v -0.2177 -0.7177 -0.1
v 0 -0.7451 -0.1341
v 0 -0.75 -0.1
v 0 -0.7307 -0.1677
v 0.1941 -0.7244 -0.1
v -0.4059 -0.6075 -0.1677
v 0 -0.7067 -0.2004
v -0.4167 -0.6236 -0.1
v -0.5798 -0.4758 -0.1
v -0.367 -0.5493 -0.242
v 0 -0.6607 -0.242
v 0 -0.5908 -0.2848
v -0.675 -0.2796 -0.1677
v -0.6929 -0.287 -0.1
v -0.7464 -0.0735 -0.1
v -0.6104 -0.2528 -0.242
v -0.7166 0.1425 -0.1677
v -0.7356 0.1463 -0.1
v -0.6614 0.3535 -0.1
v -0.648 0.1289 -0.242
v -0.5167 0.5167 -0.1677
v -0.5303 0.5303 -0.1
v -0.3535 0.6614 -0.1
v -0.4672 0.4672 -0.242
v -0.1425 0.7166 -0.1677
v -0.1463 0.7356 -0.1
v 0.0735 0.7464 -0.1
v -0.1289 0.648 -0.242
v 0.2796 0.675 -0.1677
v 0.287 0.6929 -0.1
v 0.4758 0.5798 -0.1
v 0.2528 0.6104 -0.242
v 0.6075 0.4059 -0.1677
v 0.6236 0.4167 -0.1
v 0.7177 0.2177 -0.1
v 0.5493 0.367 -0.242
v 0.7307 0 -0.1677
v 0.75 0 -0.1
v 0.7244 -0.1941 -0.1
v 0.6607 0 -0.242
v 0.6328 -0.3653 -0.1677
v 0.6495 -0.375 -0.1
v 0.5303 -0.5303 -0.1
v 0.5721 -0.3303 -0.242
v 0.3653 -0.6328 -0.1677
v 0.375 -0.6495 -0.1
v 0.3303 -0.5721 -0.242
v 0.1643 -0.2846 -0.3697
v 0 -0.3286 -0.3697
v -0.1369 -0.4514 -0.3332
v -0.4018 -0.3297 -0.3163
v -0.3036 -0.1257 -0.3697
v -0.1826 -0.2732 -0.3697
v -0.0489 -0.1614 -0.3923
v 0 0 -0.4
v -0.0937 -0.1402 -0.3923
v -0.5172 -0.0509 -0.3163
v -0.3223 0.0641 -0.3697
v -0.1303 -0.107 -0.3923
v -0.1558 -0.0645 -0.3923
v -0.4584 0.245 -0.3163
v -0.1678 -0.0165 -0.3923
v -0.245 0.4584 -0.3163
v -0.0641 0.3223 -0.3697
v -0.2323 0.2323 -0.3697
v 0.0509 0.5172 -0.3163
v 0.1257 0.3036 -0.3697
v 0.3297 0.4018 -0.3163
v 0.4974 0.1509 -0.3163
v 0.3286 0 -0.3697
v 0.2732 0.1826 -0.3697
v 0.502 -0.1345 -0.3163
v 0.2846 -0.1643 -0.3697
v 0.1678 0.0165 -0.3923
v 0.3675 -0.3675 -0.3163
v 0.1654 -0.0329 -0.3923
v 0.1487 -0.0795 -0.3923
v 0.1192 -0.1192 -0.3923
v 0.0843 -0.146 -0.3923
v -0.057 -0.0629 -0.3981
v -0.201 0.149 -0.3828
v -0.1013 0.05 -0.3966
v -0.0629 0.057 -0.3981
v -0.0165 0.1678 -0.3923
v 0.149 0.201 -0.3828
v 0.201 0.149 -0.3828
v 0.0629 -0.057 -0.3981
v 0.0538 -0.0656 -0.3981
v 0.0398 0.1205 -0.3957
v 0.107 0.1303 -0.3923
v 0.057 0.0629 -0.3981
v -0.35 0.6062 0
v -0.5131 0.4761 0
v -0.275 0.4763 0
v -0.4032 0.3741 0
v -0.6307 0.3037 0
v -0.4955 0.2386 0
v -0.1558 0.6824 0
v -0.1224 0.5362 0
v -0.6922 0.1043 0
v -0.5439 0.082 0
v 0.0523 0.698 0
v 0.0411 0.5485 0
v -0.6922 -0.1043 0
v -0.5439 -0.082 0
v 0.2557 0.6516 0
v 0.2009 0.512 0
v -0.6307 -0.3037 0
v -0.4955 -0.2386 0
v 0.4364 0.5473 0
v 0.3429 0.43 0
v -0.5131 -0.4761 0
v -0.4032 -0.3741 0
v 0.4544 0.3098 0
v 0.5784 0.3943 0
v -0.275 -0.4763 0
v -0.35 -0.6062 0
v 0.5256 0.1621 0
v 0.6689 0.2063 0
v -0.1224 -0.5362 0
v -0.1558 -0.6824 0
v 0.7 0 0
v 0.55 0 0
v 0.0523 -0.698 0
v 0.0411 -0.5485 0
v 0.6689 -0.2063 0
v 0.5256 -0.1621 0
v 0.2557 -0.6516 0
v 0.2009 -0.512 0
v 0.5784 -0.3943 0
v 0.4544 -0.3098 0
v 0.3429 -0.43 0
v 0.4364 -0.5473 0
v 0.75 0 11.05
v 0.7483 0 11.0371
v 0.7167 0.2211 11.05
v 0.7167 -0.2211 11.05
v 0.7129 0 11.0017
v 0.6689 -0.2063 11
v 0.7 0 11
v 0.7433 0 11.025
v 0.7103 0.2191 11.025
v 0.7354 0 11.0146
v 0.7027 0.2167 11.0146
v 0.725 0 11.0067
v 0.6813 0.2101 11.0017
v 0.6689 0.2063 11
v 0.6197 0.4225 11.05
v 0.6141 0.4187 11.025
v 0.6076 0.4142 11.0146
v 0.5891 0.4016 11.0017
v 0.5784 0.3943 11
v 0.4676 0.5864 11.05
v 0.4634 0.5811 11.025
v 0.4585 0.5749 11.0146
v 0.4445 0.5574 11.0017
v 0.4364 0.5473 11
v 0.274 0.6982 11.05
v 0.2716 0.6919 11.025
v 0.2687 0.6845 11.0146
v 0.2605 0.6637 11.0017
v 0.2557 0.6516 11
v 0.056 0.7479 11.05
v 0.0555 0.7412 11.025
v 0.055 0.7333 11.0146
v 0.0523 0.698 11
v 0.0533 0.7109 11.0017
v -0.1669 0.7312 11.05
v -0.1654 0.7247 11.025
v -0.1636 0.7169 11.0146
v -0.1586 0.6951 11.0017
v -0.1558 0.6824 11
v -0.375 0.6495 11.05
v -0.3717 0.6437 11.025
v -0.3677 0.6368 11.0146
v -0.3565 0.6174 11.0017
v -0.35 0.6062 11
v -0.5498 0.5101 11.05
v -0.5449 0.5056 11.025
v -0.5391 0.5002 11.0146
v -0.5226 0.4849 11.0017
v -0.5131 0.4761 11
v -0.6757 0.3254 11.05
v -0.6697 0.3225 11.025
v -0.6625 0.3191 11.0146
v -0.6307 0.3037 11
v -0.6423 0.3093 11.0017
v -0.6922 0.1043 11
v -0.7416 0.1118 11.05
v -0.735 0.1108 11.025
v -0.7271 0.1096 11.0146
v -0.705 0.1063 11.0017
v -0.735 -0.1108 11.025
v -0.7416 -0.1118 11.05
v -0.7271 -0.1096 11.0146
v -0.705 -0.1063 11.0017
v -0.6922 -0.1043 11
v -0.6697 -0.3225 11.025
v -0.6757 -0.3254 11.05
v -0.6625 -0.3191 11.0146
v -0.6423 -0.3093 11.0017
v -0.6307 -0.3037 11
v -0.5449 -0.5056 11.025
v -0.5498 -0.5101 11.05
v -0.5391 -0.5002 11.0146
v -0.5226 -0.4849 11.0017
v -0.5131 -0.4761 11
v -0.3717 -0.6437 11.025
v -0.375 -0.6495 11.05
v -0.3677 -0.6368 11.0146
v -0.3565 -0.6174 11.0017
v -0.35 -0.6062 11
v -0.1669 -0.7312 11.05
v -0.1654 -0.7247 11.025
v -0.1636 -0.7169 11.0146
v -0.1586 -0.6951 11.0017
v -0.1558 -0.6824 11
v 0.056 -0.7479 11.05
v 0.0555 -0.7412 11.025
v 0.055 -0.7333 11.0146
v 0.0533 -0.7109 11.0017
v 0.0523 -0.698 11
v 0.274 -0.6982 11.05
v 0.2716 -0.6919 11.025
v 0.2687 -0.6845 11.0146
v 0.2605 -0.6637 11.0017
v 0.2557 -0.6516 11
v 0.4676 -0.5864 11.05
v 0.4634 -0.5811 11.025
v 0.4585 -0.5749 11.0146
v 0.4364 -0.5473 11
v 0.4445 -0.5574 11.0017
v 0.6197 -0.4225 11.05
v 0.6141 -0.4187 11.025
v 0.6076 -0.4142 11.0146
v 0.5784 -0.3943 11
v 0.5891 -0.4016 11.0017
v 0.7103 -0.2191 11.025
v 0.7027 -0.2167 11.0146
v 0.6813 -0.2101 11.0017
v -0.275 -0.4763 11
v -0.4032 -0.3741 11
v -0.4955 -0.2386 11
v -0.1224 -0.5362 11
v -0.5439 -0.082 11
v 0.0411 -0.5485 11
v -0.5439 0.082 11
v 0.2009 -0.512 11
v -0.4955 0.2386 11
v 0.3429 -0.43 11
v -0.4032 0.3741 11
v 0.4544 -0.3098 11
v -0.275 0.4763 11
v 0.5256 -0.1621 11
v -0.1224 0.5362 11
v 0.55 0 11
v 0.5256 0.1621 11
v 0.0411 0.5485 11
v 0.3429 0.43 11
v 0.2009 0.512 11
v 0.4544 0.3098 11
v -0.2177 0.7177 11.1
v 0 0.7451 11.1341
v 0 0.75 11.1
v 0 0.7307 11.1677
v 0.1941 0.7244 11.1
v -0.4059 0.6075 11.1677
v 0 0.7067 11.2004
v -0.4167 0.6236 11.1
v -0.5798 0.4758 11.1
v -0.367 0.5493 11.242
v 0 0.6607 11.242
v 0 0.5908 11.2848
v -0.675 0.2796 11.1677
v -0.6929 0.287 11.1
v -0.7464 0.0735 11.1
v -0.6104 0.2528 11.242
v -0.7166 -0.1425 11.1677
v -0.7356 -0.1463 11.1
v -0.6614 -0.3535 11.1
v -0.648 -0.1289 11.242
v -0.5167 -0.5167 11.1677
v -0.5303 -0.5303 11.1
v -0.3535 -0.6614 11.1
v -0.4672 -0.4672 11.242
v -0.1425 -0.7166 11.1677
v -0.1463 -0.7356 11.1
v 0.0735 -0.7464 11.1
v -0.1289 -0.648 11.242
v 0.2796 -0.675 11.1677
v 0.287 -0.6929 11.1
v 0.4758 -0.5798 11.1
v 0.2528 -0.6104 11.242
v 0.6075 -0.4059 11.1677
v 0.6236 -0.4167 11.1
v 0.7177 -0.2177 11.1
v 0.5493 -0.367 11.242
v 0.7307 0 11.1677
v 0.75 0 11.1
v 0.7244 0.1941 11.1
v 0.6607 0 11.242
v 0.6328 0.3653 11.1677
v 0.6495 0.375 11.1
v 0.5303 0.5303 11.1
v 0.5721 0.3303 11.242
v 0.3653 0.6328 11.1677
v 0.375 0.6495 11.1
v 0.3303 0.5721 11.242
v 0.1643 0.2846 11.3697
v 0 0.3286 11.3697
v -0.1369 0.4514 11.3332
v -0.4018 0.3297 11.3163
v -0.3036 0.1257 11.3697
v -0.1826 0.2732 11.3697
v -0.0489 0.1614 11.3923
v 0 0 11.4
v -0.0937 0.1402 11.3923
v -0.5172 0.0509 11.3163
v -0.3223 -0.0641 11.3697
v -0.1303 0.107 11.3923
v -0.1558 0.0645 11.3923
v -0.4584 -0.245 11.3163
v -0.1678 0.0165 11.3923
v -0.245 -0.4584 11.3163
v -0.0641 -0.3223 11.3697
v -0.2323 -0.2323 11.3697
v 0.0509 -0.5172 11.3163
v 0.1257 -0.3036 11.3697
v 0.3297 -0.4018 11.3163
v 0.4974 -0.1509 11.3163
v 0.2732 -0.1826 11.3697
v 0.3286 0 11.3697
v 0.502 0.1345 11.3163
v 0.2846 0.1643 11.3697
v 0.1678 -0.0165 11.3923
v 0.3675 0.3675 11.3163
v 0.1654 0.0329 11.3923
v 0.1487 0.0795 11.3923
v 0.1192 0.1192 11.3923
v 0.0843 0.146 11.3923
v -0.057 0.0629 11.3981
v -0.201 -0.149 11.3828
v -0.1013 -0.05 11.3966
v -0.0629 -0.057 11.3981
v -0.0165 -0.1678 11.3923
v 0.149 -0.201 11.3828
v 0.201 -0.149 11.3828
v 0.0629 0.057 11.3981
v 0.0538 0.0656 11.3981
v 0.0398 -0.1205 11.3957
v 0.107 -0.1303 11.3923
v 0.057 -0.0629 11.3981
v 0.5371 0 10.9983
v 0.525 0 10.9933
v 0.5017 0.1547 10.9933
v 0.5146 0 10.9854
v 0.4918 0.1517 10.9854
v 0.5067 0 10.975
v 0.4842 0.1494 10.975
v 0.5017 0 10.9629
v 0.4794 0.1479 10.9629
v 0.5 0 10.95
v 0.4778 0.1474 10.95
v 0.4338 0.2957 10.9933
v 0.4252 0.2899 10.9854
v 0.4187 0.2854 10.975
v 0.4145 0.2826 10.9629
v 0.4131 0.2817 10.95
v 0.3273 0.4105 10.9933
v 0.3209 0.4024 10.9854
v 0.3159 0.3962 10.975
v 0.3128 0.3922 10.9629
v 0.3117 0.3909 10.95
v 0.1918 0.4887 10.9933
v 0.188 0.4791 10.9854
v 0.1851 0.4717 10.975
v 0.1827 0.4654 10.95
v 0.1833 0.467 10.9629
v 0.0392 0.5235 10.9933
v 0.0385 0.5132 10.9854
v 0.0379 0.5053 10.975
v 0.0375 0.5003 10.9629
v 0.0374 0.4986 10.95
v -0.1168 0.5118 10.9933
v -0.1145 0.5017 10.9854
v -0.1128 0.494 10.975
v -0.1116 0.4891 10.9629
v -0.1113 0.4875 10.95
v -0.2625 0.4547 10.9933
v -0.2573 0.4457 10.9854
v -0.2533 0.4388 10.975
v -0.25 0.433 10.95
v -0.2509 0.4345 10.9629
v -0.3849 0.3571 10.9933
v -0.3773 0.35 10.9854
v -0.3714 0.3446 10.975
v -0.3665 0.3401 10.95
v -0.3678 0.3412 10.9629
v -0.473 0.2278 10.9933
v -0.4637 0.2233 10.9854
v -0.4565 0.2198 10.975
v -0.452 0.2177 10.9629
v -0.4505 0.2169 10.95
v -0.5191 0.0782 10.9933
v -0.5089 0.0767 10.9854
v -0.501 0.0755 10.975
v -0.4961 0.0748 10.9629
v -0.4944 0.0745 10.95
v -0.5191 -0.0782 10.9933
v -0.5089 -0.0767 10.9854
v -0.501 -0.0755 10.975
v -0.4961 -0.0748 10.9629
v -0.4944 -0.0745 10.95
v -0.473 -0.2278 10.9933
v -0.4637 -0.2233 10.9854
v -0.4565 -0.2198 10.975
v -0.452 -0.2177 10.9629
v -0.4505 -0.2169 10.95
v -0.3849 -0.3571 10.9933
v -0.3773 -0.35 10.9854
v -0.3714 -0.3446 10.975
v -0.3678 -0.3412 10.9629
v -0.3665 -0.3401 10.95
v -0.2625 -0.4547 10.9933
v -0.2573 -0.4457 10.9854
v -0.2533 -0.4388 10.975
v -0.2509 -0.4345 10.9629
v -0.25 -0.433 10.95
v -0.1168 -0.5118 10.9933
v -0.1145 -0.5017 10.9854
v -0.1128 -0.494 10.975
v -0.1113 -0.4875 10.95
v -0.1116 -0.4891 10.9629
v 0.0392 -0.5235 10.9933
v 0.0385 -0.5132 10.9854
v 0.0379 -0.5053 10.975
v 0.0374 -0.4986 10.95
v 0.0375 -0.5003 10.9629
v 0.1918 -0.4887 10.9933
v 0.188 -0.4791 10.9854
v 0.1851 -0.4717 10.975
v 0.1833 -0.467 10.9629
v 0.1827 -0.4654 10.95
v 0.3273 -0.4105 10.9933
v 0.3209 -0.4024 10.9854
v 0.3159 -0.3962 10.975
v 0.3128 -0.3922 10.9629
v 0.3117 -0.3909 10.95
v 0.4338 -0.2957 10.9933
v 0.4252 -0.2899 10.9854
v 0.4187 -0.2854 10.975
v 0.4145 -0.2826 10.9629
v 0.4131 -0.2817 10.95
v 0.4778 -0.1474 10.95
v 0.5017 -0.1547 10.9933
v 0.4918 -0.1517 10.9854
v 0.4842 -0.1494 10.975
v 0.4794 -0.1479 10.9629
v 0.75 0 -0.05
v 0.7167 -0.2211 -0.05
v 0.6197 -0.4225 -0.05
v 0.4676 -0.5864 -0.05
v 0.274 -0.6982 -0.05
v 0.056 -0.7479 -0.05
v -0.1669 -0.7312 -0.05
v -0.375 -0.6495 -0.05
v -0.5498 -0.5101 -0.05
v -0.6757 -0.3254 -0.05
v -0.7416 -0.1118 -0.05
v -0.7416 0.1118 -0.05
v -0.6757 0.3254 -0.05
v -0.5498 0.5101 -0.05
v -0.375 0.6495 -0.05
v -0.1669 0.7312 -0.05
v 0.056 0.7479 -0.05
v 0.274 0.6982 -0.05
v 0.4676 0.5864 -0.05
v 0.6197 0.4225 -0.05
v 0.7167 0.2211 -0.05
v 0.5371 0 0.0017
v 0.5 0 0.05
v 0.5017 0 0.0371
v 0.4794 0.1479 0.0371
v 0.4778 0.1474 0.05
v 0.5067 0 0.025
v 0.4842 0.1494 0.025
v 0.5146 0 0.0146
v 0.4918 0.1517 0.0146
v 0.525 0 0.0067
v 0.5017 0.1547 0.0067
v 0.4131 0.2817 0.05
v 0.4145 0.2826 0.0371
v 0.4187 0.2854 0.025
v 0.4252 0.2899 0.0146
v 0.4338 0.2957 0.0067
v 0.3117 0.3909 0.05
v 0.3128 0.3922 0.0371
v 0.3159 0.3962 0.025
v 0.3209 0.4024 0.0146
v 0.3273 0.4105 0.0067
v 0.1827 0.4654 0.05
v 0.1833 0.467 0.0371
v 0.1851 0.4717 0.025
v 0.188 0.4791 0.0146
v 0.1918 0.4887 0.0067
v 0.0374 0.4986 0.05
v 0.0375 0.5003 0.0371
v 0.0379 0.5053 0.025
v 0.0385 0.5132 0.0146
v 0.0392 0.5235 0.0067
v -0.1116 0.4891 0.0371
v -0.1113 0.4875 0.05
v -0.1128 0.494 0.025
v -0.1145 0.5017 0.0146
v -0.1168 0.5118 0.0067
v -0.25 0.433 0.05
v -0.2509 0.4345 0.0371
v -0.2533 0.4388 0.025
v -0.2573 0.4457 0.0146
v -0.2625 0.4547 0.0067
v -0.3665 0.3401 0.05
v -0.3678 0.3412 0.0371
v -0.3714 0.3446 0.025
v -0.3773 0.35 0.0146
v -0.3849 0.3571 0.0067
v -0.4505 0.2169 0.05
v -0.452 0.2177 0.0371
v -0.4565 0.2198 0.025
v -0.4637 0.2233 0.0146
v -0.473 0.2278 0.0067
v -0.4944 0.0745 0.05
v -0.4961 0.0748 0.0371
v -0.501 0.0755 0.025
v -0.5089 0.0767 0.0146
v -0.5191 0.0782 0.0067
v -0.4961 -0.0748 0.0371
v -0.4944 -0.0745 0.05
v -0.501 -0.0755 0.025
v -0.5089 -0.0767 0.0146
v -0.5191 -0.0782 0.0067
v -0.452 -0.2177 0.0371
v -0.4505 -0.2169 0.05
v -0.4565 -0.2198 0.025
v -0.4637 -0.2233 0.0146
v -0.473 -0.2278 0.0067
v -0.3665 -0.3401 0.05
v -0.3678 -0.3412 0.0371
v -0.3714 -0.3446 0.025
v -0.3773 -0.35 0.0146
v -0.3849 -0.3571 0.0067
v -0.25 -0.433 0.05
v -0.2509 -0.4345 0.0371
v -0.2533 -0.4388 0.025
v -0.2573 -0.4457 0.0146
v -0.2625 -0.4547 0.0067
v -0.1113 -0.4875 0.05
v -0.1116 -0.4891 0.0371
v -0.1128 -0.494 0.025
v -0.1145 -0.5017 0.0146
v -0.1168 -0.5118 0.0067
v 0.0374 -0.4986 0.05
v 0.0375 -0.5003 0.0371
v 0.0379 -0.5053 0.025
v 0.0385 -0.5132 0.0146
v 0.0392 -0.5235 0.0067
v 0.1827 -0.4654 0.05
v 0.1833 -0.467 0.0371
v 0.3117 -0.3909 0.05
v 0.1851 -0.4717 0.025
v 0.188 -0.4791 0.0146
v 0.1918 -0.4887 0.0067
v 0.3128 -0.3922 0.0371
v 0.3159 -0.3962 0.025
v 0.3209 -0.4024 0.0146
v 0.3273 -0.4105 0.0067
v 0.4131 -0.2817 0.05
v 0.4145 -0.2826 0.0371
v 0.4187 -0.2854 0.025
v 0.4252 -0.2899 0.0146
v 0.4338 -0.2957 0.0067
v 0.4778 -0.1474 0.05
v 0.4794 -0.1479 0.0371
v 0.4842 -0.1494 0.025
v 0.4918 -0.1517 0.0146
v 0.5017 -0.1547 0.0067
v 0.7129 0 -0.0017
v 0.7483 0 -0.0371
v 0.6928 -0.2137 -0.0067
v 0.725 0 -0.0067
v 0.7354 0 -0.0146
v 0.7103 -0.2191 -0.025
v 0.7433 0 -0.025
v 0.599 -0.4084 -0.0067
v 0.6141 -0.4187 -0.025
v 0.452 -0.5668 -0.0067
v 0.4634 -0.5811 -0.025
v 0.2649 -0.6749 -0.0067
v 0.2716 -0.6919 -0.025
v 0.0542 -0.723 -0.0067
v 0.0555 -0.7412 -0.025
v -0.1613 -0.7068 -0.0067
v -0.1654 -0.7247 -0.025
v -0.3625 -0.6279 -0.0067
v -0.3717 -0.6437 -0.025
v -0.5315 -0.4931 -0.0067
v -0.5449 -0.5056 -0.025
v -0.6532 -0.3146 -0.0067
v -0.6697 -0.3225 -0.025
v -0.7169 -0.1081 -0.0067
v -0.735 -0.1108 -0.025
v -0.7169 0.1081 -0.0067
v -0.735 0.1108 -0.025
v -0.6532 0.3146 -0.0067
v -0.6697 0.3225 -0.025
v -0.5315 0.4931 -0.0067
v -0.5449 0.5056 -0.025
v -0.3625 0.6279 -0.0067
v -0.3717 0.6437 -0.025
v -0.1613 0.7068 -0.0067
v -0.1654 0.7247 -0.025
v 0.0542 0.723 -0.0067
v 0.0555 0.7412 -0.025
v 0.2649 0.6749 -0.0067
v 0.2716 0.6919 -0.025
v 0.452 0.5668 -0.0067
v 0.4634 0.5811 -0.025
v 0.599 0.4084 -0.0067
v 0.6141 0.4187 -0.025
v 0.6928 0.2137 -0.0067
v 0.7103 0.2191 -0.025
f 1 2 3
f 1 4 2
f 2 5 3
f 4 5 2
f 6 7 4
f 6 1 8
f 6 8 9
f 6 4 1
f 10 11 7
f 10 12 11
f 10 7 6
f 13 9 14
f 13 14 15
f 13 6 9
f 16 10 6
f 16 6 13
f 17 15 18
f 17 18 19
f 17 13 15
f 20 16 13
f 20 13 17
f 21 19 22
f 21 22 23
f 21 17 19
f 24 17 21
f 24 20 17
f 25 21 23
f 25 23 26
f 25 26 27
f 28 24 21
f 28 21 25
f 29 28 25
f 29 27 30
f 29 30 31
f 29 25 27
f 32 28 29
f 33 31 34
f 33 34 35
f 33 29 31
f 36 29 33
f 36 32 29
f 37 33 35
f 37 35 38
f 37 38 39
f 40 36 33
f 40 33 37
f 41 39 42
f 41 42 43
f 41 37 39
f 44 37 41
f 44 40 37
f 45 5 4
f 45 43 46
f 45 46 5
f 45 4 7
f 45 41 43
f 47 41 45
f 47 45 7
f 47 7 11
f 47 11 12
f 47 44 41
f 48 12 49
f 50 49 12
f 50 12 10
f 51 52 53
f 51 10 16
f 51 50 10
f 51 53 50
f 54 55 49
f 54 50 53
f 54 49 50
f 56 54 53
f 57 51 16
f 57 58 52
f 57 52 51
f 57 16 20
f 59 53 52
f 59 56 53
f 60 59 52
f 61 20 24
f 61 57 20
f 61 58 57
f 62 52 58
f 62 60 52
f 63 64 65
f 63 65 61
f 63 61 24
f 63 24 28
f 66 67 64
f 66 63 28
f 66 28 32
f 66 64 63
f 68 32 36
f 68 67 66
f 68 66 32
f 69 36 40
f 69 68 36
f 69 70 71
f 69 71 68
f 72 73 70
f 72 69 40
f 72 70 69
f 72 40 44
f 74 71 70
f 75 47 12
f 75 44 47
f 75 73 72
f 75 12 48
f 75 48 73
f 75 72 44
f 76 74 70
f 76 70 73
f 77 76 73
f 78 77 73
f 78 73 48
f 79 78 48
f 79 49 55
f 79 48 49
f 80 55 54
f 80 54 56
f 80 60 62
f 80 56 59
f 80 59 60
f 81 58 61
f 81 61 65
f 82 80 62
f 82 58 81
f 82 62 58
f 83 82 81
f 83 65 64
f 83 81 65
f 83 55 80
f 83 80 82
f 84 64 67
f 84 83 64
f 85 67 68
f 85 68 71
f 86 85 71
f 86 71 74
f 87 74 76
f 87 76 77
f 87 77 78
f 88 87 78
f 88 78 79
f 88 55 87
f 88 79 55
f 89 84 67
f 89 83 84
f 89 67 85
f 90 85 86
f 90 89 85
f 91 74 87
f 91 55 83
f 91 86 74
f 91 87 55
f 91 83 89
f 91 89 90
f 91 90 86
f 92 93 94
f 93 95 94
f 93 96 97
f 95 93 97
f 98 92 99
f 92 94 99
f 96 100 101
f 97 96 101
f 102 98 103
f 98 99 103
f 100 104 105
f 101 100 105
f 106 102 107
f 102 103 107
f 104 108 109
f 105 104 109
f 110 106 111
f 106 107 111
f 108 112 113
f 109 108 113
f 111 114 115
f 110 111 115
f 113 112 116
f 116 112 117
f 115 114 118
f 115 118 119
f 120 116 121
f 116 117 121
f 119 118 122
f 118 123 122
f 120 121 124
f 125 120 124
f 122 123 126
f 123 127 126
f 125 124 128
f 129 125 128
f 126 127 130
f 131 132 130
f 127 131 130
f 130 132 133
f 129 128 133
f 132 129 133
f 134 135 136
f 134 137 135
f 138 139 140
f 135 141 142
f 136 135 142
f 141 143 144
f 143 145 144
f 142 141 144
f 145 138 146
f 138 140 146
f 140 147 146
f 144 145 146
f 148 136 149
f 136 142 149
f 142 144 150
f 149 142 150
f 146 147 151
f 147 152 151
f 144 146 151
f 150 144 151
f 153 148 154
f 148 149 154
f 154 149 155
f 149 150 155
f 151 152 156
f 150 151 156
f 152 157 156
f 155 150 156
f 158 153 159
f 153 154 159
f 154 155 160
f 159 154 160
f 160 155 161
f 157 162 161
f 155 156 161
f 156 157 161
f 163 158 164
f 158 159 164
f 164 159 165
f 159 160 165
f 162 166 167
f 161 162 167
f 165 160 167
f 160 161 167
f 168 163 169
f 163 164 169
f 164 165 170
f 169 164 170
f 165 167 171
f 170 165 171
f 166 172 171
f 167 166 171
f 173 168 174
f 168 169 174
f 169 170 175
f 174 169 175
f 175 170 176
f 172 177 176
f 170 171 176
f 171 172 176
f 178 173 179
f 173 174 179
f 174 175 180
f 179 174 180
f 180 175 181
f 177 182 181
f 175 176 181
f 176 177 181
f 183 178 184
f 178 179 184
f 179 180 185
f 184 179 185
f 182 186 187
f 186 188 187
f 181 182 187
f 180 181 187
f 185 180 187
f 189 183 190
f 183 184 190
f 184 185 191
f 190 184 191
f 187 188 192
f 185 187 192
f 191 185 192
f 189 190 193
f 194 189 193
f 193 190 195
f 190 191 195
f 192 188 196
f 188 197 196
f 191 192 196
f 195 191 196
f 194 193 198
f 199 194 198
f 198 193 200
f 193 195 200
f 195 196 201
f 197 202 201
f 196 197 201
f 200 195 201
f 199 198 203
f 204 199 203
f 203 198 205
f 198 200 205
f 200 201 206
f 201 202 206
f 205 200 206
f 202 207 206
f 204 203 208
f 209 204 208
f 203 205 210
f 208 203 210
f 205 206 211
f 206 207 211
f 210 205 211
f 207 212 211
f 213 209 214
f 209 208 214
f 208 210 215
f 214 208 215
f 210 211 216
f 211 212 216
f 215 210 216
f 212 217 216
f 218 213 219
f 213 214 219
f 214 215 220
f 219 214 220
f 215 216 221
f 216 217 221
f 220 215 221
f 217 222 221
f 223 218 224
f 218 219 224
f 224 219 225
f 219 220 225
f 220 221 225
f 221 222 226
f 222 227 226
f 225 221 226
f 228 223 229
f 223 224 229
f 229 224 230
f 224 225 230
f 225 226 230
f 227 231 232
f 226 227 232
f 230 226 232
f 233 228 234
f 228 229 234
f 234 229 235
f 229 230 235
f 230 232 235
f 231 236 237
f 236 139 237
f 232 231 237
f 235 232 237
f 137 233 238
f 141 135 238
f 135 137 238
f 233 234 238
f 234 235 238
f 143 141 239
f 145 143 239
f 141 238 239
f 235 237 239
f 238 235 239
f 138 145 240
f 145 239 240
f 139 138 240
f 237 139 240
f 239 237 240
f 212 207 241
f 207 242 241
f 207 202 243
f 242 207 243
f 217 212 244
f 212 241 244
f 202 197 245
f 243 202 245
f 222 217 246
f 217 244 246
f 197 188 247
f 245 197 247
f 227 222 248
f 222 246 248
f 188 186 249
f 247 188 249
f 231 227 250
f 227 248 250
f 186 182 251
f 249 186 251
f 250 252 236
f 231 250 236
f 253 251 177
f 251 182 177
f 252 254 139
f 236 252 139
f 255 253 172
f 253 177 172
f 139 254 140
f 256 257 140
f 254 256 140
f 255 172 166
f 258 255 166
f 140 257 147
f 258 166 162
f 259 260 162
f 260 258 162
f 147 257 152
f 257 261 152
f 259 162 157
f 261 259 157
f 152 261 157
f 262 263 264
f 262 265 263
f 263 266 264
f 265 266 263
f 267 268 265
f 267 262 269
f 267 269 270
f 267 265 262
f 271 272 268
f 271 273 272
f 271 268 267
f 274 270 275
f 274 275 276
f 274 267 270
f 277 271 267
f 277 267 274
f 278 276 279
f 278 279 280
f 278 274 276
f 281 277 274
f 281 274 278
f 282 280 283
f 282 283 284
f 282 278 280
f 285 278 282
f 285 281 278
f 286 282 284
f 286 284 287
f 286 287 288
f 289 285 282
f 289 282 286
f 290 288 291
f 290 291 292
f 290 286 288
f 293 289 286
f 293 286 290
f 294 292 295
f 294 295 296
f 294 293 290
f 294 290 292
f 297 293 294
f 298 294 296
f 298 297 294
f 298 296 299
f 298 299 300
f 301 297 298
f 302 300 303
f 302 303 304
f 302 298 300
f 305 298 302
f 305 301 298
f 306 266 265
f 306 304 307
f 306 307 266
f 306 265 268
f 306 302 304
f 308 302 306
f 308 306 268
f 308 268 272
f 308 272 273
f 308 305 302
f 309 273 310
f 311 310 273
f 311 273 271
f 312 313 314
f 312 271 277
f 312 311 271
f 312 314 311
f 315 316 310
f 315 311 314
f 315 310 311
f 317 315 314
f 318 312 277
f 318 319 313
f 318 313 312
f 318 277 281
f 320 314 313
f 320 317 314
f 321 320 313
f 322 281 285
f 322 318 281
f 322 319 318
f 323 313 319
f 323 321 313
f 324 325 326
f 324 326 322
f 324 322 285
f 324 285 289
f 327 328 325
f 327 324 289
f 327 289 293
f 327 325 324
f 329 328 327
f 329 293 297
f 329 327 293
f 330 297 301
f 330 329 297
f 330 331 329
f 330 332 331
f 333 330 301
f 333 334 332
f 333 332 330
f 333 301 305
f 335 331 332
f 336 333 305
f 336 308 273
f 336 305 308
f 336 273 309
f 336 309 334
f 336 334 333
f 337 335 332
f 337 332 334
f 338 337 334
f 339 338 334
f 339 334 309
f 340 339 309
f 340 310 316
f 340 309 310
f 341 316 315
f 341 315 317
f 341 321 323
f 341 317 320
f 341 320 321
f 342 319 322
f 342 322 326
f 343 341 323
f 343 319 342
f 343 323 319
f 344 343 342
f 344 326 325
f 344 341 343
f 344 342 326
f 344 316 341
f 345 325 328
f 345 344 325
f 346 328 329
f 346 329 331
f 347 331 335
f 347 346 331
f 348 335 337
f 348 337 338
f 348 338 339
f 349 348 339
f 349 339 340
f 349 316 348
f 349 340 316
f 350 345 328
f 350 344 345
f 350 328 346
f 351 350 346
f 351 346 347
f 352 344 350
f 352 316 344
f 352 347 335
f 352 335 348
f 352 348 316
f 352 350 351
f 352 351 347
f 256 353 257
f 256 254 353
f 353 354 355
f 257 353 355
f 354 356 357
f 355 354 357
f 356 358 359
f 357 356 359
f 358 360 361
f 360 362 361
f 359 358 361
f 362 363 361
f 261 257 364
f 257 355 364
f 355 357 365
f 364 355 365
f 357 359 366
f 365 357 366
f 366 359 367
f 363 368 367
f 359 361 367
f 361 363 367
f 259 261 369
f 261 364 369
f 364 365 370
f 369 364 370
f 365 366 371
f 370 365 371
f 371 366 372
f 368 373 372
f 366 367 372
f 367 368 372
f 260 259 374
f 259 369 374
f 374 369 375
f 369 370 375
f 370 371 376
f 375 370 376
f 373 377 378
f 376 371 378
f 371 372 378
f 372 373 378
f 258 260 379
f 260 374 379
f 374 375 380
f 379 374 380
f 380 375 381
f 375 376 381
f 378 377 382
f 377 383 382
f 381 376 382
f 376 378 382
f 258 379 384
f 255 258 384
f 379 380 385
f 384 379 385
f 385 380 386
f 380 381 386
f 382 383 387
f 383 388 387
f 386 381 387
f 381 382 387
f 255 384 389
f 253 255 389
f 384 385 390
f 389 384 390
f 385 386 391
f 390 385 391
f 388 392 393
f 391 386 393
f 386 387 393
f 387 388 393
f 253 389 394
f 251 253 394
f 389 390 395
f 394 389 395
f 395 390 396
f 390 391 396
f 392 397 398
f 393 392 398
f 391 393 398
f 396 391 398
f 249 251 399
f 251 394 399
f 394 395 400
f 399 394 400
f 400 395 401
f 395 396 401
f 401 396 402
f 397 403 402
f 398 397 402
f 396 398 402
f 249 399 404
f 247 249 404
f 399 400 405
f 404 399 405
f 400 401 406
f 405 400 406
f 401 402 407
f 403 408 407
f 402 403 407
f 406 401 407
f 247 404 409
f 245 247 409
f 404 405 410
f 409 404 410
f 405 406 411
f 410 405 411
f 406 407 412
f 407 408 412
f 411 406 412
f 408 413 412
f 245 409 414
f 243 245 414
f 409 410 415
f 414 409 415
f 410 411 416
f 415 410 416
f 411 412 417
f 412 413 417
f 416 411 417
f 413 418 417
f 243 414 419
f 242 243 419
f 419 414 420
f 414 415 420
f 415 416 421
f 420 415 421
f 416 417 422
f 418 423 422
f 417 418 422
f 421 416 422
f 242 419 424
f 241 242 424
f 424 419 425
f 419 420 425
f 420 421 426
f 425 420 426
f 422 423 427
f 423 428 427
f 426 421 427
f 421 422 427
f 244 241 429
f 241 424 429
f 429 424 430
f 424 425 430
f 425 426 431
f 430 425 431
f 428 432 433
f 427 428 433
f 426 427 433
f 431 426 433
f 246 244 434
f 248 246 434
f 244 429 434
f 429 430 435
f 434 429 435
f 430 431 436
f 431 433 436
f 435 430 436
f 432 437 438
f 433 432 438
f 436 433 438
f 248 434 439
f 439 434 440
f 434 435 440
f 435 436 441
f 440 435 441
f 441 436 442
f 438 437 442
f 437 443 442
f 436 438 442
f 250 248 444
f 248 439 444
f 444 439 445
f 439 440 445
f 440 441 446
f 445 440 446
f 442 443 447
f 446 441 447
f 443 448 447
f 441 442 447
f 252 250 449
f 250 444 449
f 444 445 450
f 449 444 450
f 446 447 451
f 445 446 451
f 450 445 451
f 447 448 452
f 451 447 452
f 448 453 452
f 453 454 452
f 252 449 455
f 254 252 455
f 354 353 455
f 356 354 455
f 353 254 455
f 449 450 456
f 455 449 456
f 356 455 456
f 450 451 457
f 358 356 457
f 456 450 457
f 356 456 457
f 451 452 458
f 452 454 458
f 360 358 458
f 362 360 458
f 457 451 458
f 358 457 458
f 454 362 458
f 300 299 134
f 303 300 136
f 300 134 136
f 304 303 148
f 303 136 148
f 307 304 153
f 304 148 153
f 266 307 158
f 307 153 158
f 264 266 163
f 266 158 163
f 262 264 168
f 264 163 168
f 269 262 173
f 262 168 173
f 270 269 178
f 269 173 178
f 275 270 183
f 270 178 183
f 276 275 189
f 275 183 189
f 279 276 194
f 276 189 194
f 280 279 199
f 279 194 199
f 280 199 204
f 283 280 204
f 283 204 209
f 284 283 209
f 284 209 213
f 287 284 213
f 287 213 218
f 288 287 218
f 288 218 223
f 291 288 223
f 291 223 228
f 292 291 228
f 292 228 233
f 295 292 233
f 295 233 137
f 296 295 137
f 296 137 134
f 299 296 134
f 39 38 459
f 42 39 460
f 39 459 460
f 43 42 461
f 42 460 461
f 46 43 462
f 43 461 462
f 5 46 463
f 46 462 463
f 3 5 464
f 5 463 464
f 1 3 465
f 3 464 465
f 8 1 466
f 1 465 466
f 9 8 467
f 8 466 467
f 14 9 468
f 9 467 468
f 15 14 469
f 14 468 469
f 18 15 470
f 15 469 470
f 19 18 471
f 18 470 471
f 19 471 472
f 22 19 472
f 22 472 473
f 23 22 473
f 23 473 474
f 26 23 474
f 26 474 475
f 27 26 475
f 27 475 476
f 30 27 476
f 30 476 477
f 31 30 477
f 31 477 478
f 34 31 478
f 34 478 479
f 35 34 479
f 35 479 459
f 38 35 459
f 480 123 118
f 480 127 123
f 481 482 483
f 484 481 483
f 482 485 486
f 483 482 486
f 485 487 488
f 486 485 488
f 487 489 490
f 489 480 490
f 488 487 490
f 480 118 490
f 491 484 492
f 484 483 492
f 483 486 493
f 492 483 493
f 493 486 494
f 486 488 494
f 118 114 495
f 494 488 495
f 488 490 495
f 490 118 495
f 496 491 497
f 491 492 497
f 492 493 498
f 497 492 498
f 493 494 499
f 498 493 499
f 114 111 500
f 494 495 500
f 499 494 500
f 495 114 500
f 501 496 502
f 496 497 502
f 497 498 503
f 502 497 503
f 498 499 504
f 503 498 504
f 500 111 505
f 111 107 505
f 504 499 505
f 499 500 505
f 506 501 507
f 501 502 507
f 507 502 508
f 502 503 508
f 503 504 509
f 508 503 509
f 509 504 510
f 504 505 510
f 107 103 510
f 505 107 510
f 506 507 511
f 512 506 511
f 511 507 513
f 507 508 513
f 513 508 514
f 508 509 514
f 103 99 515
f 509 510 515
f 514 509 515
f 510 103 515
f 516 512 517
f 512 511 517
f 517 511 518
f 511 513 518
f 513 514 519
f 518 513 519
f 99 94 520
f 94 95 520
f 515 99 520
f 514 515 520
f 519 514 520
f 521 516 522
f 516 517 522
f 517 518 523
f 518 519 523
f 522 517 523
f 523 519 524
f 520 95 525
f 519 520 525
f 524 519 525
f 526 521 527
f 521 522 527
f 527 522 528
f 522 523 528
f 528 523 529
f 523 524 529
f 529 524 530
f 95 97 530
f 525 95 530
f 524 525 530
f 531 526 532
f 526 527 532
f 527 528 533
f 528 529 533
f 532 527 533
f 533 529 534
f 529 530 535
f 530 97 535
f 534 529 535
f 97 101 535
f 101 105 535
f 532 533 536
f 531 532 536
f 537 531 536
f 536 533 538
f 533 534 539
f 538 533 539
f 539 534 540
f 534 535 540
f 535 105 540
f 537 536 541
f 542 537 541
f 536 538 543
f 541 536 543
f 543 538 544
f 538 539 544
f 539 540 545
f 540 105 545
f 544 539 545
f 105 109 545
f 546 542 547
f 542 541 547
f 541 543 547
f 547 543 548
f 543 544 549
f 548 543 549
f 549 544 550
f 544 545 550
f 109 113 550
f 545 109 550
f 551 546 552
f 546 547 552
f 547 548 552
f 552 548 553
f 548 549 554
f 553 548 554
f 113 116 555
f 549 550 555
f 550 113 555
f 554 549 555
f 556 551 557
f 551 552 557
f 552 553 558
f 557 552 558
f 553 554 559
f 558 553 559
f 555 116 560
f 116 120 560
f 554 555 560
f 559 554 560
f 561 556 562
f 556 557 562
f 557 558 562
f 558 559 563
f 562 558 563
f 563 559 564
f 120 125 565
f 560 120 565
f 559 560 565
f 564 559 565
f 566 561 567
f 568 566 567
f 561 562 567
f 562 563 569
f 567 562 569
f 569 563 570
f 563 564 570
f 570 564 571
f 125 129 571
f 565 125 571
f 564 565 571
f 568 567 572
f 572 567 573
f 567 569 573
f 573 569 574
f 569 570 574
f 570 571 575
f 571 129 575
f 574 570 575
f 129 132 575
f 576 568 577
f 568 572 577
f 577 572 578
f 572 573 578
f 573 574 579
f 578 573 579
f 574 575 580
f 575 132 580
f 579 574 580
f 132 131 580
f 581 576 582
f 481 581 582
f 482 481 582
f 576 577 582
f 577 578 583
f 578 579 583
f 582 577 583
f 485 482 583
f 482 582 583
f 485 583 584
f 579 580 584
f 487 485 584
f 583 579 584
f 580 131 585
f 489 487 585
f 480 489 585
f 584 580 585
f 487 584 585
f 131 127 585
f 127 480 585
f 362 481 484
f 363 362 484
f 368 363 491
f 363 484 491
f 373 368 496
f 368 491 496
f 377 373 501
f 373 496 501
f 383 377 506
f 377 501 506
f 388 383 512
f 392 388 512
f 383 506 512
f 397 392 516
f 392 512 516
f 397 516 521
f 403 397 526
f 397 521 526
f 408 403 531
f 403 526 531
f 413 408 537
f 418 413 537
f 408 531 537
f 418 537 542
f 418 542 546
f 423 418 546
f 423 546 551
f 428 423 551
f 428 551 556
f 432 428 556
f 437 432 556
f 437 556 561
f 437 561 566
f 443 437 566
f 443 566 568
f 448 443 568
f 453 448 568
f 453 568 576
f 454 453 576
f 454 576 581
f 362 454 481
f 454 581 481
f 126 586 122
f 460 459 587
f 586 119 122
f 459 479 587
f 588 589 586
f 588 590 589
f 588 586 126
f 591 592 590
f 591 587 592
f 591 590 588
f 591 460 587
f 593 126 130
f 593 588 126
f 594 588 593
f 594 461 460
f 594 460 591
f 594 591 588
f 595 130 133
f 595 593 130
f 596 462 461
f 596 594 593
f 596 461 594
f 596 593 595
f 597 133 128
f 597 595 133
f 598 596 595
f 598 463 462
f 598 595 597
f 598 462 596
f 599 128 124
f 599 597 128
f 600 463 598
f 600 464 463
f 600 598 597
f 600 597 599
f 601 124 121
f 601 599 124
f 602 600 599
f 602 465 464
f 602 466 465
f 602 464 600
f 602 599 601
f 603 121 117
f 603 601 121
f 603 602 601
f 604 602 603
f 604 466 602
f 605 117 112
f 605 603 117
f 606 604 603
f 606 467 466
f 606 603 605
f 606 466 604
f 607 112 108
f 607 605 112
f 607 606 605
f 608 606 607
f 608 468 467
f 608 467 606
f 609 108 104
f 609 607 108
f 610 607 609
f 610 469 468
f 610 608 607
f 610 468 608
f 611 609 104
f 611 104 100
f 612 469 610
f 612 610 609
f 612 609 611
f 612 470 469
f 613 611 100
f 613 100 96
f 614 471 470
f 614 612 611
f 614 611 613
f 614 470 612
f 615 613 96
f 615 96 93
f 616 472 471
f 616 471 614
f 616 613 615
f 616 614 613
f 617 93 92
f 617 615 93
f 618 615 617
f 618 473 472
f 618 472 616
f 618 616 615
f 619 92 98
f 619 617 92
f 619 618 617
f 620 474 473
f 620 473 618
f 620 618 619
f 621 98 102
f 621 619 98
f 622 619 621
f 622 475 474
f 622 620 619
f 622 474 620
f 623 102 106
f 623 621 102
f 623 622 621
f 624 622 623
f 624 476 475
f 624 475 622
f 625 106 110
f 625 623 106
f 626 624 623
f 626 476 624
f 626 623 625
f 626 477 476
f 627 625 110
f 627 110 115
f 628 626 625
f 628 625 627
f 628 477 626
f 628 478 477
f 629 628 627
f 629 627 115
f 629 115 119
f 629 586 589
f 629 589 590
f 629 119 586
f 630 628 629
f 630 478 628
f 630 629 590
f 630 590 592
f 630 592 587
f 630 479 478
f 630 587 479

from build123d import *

# Parameters (mm, degrees)
SKETCH1_R           = 0.5
BOSS_EXTRUDE1_DEPTH = 11
SKETCH2_R           = 0.75
BOSS_EXTRUDE2_DEPTH = 0.1
BOSS_EXTRUDE3_START = 0.1
SKETCH3_R           = 0.75
BOSS_EXTRUDE3_DEPTH = 0.1
DOME1_FACE_RADIUS   = 0.75
DOME1_HEIGHT        = 0.3
DOME2_FACE_RADIUS   = 0.75
DOME2_HEIGHT        = 0.3
FILLET2_R           = 0.05


with BuildPart() as part:
    # Sketch1 → Boss-Extrude1 (new body)
    with BuildSketch(Plane.XY):
        Circle(SKETCH1_R)
    extrude(amount=BOSS_EXTRUDE1_DEPTH)

    # Sketch2 → Boss-Extrude2 (add)
    with BuildSketch(Plane.XY.offset(11)):
        Circle(SKETCH2_R)
    extrude(amount=BOSS_EXTRUDE2_DEPTH)

    # Sketch3 → Boss-Extrude3 (add)
    with BuildSketch(Plane(origin=(0, 0, 0), x_dir=(-1, 0, 0), z_dir=(0, 0, -1)).offset(BOSS_EXTRUDE3_START)):
        Circle(SKETCH3_R)
    extrude(amount=-BOSS_EXTRUDE3_DEPTH)

    # Dome1: an elliptical dome of height H over a round flat face of radius A is half a spheroid: the quarter ellipse of half axes A and H revolved about the face's axis
    with BuildSketch(Plane((0, 0, -0.1), x_dir=(0, -1, 0), z_dir=(1, 0, 0)), mode=Mode.PRIVATE) as dome1_quarter:
        Ellipse(DOME1_FACE_RADIUS, DOME1_HEIGHT)
        Rectangle(DOME1_FACE_RADIUS, DOME1_HEIGHT, align=(Align.MIN, Align.MIN), mode=Mode.INTERSECT)
    revolve(dome1_quarter.sketch, axis=Axis((0, 0, -0.1), (0, 0, -1)))

    # Dome2: an elliptical dome of height H over a round flat face of radius A is half a spheroid: the quarter ellipse of half axes A and H revolved about the face's axis
    with BuildSketch(Plane((0, 0, 11.1), x_dir=(0, 1, 0), z_dir=(1, 0, 0)), mode=Mode.PRIVATE) as dome2_quarter:
        Ellipse(DOME2_FACE_RADIUS, DOME2_HEIGHT)
        Rectangle(DOME2_FACE_RADIUS, DOME2_HEIGHT, align=(Align.MIN, Align.MIN), mode=Mode.INTERSECT)
    revolve(dome2_quarter.sketch, axis=Axis((0, 0, 11.1), (0, 0, 1)))

    # Fillet2
    fillet2_edges = [part.edges().sort_by_distance(p)[0] for p in [
        (-0.5, 0, 11),
        (-0.75, 0, 11),
        (-0.5, 0, 0),
        (0.75, 0, 0),
    ]]
    fillet(fillet2_edges, radius=FILLET2_R)


solid = part.part
